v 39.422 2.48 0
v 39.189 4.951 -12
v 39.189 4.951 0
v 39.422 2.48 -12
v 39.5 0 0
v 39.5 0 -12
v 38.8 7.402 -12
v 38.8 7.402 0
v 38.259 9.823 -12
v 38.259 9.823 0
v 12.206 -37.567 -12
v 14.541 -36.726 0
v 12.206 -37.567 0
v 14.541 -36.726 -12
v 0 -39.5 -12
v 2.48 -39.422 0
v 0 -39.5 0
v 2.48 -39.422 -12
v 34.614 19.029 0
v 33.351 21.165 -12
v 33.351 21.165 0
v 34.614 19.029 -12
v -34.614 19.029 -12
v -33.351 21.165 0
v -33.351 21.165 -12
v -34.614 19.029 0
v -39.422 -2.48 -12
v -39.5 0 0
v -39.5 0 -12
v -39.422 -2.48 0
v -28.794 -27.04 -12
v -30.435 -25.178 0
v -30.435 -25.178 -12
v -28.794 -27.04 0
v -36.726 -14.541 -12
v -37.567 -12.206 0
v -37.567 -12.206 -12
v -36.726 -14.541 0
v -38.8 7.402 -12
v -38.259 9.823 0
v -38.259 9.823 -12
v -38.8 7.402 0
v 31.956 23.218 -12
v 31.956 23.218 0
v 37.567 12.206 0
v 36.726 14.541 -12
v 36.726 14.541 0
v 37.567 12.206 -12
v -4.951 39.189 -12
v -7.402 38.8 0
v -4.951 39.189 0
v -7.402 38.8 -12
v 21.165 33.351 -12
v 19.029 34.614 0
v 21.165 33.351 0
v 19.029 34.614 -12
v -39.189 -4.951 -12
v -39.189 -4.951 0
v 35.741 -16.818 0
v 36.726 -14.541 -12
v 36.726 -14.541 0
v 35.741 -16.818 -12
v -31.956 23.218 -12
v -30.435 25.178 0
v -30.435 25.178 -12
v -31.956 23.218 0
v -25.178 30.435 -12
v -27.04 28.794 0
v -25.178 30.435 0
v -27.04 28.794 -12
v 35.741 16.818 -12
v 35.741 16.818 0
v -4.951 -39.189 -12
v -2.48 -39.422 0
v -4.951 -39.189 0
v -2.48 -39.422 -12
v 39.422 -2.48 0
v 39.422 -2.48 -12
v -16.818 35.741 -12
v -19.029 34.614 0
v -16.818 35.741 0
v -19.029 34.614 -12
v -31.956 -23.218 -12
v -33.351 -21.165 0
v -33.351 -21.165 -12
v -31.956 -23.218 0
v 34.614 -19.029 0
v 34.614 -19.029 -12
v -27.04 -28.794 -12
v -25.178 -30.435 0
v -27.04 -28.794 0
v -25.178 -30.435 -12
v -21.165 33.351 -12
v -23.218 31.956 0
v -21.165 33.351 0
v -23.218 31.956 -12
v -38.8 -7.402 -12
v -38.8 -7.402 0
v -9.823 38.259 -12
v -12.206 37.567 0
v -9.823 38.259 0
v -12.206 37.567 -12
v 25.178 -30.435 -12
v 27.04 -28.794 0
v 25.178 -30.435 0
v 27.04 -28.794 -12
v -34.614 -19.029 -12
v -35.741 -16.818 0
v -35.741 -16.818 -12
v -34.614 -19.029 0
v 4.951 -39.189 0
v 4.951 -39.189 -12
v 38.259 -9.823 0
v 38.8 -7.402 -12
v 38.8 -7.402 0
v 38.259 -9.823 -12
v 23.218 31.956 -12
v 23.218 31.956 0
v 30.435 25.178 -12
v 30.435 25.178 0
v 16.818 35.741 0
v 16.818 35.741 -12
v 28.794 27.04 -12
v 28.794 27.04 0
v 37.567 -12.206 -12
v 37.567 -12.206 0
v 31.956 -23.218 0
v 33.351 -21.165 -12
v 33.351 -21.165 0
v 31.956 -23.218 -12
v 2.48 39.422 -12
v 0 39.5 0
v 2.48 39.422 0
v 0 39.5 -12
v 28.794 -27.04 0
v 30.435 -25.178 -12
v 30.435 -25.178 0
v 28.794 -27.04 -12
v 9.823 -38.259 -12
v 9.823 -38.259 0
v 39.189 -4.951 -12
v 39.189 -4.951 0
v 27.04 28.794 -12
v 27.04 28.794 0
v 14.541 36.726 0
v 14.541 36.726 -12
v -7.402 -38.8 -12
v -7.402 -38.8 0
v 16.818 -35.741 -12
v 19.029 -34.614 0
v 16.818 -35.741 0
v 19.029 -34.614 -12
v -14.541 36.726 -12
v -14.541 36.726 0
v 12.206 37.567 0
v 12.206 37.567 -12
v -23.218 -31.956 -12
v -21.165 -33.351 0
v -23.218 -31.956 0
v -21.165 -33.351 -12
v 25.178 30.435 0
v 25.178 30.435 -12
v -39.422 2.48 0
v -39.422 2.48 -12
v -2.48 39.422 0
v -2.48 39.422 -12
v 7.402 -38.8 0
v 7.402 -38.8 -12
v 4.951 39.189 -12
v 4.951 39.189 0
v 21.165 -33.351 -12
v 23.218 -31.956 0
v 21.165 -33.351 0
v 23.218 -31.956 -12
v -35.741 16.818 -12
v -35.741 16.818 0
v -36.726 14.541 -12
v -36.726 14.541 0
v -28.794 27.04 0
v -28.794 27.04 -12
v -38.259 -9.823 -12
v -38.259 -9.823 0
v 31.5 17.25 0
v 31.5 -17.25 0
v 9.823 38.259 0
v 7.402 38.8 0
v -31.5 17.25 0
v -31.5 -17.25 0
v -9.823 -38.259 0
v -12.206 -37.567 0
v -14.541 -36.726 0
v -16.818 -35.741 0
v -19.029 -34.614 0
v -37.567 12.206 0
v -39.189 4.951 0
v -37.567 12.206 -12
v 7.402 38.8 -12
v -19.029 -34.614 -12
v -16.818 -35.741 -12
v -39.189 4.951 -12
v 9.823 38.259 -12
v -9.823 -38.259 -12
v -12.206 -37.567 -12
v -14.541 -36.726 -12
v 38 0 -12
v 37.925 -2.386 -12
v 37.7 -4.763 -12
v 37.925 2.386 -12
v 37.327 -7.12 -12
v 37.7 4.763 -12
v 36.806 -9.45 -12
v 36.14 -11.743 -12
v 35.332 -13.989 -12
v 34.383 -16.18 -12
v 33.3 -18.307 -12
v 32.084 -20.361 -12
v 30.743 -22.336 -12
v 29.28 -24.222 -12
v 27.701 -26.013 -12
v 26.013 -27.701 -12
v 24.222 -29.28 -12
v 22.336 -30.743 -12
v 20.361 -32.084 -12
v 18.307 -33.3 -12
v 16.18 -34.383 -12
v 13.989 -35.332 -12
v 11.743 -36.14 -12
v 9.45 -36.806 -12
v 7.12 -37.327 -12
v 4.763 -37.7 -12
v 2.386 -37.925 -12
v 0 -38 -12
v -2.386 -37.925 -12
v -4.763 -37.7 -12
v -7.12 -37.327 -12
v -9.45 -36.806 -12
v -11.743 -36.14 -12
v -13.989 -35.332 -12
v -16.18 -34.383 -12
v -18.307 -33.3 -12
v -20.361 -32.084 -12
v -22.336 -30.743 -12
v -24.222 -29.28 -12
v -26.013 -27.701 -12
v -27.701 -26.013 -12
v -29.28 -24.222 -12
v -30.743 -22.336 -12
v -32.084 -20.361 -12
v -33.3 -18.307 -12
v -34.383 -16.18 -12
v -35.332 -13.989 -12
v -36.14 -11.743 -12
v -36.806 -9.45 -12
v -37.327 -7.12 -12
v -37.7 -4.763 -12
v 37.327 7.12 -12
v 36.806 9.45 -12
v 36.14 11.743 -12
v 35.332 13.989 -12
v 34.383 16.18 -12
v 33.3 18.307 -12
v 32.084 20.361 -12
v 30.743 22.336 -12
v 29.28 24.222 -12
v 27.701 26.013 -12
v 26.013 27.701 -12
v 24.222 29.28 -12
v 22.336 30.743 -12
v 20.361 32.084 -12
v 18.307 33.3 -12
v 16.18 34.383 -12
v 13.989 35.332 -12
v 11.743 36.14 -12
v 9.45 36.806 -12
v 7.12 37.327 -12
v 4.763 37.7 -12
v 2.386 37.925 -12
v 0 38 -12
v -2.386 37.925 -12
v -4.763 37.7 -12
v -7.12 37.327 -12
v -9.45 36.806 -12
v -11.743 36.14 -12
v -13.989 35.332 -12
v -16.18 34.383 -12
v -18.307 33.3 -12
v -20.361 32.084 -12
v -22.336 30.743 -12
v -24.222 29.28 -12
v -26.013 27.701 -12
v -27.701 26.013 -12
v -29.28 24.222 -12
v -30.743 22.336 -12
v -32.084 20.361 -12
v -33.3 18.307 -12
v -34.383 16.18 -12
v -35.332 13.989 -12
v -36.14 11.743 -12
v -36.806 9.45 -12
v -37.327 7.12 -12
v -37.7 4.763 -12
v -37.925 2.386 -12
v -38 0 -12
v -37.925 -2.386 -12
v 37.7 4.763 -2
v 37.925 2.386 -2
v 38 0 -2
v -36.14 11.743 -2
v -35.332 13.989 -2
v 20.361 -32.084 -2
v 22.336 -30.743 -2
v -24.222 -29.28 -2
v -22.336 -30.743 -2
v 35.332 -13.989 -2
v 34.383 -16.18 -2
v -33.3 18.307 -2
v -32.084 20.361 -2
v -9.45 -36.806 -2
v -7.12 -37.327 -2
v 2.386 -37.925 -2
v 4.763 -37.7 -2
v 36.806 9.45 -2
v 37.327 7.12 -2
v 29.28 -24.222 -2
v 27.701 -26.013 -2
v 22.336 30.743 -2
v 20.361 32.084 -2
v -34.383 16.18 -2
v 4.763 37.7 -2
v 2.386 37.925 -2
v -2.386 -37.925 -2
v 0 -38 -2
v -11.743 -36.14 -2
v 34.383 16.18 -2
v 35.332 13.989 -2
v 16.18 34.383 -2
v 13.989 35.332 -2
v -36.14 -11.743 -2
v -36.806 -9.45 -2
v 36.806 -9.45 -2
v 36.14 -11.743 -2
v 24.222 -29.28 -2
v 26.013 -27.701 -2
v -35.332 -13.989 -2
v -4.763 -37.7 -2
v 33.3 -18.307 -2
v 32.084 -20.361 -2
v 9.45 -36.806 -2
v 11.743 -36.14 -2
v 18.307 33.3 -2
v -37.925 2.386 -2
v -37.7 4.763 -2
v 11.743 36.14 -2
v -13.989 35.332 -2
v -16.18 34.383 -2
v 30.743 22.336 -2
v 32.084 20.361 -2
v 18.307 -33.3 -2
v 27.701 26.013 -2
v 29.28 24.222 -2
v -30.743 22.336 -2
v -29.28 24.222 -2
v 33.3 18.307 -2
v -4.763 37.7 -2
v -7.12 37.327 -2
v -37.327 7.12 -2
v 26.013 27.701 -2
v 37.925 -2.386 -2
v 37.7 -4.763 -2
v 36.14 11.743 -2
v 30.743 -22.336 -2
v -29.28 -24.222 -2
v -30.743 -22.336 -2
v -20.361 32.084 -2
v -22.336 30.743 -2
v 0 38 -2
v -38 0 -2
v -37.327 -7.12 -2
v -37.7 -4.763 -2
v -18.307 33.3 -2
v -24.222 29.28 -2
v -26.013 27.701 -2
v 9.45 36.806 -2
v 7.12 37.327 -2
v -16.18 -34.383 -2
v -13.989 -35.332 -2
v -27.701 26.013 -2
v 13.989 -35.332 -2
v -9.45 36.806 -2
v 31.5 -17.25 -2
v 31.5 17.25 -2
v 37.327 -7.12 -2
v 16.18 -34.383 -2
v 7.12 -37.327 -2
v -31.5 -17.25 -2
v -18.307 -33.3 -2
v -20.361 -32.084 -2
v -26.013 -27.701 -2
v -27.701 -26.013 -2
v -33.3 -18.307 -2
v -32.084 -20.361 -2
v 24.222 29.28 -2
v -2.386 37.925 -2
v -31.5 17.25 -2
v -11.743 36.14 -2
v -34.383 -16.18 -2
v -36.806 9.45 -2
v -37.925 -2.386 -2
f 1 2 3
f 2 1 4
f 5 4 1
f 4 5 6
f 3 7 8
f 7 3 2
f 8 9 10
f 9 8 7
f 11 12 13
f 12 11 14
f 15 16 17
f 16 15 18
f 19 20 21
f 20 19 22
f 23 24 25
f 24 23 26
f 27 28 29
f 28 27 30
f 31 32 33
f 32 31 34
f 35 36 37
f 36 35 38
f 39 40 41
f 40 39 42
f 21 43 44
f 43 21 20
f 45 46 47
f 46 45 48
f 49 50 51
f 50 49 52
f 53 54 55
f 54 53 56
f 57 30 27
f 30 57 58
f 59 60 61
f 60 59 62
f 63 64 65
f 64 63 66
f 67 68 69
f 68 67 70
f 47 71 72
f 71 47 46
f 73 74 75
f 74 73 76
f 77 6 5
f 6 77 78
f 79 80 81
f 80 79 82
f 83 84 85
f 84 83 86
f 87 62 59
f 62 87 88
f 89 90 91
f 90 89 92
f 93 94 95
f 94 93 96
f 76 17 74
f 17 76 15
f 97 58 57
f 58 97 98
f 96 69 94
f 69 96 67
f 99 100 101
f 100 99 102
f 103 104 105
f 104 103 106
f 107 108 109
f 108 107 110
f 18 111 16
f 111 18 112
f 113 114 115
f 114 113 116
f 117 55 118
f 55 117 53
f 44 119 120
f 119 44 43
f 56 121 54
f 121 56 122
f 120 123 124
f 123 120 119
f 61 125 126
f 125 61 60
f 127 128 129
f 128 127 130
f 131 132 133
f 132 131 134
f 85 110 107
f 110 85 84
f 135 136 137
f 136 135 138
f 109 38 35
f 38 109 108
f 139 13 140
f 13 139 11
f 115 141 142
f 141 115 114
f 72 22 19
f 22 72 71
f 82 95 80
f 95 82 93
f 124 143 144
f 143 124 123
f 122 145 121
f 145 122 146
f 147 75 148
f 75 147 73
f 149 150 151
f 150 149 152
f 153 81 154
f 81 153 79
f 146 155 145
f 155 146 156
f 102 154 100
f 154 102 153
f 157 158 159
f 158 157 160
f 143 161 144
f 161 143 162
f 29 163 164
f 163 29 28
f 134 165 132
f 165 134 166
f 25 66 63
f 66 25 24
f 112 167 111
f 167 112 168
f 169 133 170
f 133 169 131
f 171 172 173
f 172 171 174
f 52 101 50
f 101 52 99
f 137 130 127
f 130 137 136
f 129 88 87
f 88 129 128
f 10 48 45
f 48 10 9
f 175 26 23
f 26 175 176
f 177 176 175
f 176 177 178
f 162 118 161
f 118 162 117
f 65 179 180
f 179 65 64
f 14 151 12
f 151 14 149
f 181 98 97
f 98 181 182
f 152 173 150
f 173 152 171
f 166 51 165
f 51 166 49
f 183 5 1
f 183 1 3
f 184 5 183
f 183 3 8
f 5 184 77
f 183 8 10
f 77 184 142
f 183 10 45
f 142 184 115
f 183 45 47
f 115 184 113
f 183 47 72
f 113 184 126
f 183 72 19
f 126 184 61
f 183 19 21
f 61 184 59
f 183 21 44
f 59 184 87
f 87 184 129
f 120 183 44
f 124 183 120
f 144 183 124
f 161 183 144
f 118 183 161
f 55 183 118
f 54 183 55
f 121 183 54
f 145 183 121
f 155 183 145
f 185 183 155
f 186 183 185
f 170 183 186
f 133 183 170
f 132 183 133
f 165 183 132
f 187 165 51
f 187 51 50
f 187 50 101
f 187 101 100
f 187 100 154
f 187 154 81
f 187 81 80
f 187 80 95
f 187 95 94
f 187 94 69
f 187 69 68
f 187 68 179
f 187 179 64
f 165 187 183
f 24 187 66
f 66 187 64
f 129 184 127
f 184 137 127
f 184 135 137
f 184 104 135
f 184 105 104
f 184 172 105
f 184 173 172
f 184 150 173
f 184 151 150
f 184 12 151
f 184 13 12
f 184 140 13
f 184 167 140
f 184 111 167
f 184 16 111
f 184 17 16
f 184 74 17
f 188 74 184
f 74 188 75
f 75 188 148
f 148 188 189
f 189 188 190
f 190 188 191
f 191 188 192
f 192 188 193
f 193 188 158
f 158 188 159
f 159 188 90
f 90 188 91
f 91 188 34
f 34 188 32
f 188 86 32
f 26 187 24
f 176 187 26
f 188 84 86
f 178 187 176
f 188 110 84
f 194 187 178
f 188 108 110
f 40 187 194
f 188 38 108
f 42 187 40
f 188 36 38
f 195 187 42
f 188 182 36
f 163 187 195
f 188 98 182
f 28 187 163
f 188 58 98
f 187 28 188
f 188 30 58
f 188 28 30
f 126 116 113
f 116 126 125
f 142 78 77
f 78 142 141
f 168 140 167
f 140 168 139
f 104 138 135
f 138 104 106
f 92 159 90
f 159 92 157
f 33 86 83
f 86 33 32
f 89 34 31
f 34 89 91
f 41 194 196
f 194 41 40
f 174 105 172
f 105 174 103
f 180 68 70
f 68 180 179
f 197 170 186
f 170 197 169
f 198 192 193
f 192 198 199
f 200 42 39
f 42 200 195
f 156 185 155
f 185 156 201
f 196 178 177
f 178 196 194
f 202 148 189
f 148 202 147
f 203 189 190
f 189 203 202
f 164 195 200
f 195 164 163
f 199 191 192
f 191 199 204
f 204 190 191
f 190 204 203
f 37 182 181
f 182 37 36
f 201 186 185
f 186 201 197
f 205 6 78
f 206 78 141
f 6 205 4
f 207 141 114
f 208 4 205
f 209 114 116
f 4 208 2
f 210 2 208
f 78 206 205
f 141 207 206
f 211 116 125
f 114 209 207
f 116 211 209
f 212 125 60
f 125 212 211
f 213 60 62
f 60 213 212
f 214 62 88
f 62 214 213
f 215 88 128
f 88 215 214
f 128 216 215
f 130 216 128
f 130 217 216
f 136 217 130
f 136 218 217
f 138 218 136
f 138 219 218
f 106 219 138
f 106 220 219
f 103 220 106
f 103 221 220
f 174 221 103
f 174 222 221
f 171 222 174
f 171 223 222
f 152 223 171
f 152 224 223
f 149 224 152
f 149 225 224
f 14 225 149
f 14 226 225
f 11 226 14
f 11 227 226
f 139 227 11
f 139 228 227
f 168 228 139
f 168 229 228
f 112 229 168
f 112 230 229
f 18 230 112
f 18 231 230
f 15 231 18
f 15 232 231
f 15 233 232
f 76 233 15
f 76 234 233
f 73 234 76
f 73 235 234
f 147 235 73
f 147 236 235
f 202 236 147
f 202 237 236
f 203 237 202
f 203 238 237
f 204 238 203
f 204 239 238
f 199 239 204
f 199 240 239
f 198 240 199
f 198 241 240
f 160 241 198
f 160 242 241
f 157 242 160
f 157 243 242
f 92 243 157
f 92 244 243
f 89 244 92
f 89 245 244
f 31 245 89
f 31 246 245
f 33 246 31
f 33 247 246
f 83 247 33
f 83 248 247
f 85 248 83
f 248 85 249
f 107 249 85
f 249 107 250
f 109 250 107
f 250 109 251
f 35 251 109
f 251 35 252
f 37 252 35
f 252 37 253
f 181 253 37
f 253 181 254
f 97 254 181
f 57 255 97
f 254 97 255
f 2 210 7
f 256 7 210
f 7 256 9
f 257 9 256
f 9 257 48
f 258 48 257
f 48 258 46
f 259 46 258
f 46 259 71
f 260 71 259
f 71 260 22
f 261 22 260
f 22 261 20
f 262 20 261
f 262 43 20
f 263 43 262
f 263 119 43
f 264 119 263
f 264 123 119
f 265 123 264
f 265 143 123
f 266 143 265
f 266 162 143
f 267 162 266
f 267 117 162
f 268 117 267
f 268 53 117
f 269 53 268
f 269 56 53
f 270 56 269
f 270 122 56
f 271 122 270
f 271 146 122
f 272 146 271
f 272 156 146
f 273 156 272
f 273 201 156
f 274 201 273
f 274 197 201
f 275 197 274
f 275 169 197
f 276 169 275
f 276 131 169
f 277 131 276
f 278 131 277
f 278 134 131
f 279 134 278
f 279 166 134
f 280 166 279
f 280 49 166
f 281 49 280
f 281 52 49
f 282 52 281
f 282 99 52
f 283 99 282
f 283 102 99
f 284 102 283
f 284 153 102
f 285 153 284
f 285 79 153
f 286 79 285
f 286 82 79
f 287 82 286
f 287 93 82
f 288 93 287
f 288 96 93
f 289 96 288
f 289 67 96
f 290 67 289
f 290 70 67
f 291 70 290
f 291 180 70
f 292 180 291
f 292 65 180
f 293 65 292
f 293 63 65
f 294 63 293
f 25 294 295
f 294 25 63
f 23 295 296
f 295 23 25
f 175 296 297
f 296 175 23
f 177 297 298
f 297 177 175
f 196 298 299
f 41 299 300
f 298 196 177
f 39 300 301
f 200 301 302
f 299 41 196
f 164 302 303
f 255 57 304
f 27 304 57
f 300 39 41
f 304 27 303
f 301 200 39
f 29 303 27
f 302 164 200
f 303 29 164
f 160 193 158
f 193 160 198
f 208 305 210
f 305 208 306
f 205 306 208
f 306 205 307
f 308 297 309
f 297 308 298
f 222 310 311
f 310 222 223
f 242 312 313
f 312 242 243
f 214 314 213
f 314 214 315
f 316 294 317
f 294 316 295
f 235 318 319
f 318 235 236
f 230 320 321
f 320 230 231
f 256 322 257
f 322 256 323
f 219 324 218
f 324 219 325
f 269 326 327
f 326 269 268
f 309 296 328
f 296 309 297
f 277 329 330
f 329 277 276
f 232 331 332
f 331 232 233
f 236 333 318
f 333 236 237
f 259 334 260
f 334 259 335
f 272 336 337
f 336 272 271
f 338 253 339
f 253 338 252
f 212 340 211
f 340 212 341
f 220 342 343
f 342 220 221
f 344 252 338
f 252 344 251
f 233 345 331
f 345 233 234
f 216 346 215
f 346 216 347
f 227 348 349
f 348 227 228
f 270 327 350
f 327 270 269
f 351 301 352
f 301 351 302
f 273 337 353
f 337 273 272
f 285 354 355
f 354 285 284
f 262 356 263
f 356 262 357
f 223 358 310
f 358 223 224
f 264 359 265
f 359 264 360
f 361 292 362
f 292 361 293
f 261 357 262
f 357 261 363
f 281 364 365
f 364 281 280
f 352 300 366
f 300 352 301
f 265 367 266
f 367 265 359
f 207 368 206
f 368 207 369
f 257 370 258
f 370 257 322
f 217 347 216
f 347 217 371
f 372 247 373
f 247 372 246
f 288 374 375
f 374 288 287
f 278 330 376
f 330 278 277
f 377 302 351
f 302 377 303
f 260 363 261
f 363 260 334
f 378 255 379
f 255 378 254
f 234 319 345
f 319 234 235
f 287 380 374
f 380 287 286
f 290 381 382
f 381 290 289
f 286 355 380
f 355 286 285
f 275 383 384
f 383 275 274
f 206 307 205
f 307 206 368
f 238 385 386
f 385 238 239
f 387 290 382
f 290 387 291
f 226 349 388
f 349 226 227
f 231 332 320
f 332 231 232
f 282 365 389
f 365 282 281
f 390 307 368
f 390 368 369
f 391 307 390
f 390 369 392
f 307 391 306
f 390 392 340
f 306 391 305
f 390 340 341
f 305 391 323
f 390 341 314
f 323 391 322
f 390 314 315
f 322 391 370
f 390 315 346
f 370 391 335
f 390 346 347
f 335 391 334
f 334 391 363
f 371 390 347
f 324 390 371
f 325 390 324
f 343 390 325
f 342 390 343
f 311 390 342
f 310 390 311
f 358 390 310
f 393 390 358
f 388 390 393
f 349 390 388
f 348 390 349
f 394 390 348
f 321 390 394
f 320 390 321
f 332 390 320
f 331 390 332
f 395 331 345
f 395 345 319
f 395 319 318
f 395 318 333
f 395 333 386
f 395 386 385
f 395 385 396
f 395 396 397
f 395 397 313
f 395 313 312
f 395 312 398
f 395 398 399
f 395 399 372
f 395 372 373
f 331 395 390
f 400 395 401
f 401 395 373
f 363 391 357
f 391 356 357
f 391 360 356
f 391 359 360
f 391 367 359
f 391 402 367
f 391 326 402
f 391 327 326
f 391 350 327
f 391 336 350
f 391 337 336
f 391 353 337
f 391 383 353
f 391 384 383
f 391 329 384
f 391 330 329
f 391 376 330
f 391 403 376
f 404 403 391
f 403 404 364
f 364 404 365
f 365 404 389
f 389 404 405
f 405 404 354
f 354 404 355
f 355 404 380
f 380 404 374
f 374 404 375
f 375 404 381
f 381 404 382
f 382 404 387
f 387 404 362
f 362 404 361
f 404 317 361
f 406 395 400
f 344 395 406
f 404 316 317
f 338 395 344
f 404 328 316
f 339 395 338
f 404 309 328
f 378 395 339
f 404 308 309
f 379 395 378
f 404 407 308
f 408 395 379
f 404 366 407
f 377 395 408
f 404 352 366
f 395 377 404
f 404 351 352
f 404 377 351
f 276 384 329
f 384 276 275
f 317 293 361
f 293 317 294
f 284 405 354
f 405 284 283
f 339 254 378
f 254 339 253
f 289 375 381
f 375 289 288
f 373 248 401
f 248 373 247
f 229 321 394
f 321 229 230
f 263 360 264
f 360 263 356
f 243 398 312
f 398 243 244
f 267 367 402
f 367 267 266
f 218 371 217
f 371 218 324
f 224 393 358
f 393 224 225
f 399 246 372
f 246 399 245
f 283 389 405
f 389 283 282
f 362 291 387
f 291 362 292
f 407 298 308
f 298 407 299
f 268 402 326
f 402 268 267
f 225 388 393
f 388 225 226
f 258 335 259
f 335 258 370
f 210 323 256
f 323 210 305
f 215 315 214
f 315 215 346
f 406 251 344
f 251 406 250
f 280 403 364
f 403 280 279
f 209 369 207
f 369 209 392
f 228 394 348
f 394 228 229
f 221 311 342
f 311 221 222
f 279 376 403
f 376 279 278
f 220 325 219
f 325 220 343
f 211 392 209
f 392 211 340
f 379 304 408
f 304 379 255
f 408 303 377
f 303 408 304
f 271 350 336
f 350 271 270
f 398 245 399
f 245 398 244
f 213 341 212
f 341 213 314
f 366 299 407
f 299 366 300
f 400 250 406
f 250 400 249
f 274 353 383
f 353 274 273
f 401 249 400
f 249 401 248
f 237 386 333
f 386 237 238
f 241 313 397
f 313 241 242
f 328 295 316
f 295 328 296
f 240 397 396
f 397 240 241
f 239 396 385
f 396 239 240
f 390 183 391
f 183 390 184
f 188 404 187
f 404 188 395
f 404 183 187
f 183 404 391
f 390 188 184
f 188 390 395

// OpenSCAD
//
// ktCAM1
//
//


gap1 = 0.001;
gap2 = 0.002;

circle = 76;
panel_thick = 2;

A = 0;
L = 0;
R = 0;
B = 1;


BOXINNE = 30;
BOXBASE = BOXINNE+panel_thick*2;




module BOX_R()
{
    difference()
    {
        cube( [BOXBASE, BOXBASE, BOXBASE] );
        translate( [BOXBASE/2, BOXBASE/2, BOXINNE-gap2] ) cylinder( panel_thick*3, 18/2, 18/2, $fn=100 );
        translate( [BOXBASE/2, BOXBASE/2, 15] ) difference()
        {
            union()
            {
                sphere(r = 29/2);
                translate( [0, 0, 9] ) cylinder( 9, 22/2, 20.5/2 );
                translate( [0, -14.3, 0] ) rotate( [90, 0, 0] ) cylinder( 2, 3/2, 3/2, $fn=10 );
            }
            translate( [0, 0, -8-BOXBASE/2] ) cube( [BOXBASE, BOXBASE, BOXBASE], center=true);
        }
    }
}
        
            
if( A )
{
    difference()
    {
    union()
    {
    difference()
    {
    union()
    {
    translate( [30, BOXBASE/2, 0] ) rotate( [0, -45, 180] ) BOX_R();



    translate( [-30, -BOXBASE/2, 0] ) rotate( [0, -45, 0] )
    {
        union()
        {
            difference()
            {
                cube( [BOXBASE, BOXBASE, BOXBASE] );
                translate( [(BOXBASE-24)/2, (BOXBASE-24)/2, (BOXBASE-24)-panel_thick/2] ) cube( [24, 24, 24] );
                translate( [BOXBASE/2, BOXBASE/2, BOXINNE-gap2] ) cylinder( panel_thick*3, 13/2, 13/2, $fn=100 );
            }
        }
    }



    difference()
    {
        translate( [-(circle-14)/2, -BOXBASE/2, -4] ) cube( [circle-14, BOXBASE, (BOXBASE*sqrt(2))/2+4] );
        translate( [30, BOXBASE/2+gap1, 0] ) rotate( [0, -45, 180] ) cube( [BOXBASE, BOXBASE+gap2, BOXBASE] );
        translate( [-30, -BOXBASE/2-gap1, 0] ) rotate( [0, -45, 0] ) cube( [BOXBASE, BOXBASE+gap2, BOXBASE] );
    }
    }
    if( L == 0 )
    {
        translate( [0, -100, 0] ) cube( [200, 200, 200], center=true);
    }
    if( R == 0 )
    {
        translate( [0, 100, 0] ) cube( [200, 200, 200], center=true);
    }
    //translate( [-101.5, 0, 0] ) rotate( [0, 45, 0] ) cube( [200, 200, 200], center=true);
    //translate( [101.5, 0, 0] ) rotate( [0, -45, 180] ) cube( [200, 200, 200], center=true);
    }
    }
    translate( [-(circle-14)/2+panel_thick, -BOXBASE/2+panel_thick, -10-gap1] ) cube( [circle-14-panel_thick*2, BOXBASE-panel_thick*2, (BOXBASE*sqrt(2))/2+10-panel_thick] );
    translate( [-40, -15/2, 20] ) rotate( [0, 45, 0] ) cube( [30, 15, 10] );
    if( L )
    {
        translate( [49, 0, 23] ) HOLE();
        translate( [29, 0, 43] ) HOLE();
        translate( [-49, 0, 23] ) HOLE();
        translate( [-29, 0, 43] ) HOLE();
    }
    }
    if( R )
    {
        translate( [49, 0, 23] ) PIN();
        translate( [29, 0, 43] ) PIN();
        translate( [-49, 0, 23] ) PIN();
        translate( [-29, 0, 43] ) PIN();
    }
}



if( B )
{
    translate( [0, 0, -(10+panel_thick)] ) difference()
    {
        cylinder( 10+panel_thick, (circle+panel_thick+1)/2, (circle+panel_thick+1)/2, $fn=100 );
        translate( [0, 0, -gap1] ) cylinder( 10+gap1, circle/2, circle/2, $fn=100 );
        translate( [-(circle-14)/2-1/2, -BOXBASE/2-0.5/2, 10-gap1] ) cube( [circle-14+1, BOXBASE+0.5, panel_thick+gap2] );
    }
}


module PIN()
{
    rotate( [90, 0, 0] ) cylinder( 5, 1.5, 1, $fn=10 );
}
module HOLE()
{
    rotate( [90, 0, 0] ) cylinder( 5, 2, 1.5, $fn=10 );
}
